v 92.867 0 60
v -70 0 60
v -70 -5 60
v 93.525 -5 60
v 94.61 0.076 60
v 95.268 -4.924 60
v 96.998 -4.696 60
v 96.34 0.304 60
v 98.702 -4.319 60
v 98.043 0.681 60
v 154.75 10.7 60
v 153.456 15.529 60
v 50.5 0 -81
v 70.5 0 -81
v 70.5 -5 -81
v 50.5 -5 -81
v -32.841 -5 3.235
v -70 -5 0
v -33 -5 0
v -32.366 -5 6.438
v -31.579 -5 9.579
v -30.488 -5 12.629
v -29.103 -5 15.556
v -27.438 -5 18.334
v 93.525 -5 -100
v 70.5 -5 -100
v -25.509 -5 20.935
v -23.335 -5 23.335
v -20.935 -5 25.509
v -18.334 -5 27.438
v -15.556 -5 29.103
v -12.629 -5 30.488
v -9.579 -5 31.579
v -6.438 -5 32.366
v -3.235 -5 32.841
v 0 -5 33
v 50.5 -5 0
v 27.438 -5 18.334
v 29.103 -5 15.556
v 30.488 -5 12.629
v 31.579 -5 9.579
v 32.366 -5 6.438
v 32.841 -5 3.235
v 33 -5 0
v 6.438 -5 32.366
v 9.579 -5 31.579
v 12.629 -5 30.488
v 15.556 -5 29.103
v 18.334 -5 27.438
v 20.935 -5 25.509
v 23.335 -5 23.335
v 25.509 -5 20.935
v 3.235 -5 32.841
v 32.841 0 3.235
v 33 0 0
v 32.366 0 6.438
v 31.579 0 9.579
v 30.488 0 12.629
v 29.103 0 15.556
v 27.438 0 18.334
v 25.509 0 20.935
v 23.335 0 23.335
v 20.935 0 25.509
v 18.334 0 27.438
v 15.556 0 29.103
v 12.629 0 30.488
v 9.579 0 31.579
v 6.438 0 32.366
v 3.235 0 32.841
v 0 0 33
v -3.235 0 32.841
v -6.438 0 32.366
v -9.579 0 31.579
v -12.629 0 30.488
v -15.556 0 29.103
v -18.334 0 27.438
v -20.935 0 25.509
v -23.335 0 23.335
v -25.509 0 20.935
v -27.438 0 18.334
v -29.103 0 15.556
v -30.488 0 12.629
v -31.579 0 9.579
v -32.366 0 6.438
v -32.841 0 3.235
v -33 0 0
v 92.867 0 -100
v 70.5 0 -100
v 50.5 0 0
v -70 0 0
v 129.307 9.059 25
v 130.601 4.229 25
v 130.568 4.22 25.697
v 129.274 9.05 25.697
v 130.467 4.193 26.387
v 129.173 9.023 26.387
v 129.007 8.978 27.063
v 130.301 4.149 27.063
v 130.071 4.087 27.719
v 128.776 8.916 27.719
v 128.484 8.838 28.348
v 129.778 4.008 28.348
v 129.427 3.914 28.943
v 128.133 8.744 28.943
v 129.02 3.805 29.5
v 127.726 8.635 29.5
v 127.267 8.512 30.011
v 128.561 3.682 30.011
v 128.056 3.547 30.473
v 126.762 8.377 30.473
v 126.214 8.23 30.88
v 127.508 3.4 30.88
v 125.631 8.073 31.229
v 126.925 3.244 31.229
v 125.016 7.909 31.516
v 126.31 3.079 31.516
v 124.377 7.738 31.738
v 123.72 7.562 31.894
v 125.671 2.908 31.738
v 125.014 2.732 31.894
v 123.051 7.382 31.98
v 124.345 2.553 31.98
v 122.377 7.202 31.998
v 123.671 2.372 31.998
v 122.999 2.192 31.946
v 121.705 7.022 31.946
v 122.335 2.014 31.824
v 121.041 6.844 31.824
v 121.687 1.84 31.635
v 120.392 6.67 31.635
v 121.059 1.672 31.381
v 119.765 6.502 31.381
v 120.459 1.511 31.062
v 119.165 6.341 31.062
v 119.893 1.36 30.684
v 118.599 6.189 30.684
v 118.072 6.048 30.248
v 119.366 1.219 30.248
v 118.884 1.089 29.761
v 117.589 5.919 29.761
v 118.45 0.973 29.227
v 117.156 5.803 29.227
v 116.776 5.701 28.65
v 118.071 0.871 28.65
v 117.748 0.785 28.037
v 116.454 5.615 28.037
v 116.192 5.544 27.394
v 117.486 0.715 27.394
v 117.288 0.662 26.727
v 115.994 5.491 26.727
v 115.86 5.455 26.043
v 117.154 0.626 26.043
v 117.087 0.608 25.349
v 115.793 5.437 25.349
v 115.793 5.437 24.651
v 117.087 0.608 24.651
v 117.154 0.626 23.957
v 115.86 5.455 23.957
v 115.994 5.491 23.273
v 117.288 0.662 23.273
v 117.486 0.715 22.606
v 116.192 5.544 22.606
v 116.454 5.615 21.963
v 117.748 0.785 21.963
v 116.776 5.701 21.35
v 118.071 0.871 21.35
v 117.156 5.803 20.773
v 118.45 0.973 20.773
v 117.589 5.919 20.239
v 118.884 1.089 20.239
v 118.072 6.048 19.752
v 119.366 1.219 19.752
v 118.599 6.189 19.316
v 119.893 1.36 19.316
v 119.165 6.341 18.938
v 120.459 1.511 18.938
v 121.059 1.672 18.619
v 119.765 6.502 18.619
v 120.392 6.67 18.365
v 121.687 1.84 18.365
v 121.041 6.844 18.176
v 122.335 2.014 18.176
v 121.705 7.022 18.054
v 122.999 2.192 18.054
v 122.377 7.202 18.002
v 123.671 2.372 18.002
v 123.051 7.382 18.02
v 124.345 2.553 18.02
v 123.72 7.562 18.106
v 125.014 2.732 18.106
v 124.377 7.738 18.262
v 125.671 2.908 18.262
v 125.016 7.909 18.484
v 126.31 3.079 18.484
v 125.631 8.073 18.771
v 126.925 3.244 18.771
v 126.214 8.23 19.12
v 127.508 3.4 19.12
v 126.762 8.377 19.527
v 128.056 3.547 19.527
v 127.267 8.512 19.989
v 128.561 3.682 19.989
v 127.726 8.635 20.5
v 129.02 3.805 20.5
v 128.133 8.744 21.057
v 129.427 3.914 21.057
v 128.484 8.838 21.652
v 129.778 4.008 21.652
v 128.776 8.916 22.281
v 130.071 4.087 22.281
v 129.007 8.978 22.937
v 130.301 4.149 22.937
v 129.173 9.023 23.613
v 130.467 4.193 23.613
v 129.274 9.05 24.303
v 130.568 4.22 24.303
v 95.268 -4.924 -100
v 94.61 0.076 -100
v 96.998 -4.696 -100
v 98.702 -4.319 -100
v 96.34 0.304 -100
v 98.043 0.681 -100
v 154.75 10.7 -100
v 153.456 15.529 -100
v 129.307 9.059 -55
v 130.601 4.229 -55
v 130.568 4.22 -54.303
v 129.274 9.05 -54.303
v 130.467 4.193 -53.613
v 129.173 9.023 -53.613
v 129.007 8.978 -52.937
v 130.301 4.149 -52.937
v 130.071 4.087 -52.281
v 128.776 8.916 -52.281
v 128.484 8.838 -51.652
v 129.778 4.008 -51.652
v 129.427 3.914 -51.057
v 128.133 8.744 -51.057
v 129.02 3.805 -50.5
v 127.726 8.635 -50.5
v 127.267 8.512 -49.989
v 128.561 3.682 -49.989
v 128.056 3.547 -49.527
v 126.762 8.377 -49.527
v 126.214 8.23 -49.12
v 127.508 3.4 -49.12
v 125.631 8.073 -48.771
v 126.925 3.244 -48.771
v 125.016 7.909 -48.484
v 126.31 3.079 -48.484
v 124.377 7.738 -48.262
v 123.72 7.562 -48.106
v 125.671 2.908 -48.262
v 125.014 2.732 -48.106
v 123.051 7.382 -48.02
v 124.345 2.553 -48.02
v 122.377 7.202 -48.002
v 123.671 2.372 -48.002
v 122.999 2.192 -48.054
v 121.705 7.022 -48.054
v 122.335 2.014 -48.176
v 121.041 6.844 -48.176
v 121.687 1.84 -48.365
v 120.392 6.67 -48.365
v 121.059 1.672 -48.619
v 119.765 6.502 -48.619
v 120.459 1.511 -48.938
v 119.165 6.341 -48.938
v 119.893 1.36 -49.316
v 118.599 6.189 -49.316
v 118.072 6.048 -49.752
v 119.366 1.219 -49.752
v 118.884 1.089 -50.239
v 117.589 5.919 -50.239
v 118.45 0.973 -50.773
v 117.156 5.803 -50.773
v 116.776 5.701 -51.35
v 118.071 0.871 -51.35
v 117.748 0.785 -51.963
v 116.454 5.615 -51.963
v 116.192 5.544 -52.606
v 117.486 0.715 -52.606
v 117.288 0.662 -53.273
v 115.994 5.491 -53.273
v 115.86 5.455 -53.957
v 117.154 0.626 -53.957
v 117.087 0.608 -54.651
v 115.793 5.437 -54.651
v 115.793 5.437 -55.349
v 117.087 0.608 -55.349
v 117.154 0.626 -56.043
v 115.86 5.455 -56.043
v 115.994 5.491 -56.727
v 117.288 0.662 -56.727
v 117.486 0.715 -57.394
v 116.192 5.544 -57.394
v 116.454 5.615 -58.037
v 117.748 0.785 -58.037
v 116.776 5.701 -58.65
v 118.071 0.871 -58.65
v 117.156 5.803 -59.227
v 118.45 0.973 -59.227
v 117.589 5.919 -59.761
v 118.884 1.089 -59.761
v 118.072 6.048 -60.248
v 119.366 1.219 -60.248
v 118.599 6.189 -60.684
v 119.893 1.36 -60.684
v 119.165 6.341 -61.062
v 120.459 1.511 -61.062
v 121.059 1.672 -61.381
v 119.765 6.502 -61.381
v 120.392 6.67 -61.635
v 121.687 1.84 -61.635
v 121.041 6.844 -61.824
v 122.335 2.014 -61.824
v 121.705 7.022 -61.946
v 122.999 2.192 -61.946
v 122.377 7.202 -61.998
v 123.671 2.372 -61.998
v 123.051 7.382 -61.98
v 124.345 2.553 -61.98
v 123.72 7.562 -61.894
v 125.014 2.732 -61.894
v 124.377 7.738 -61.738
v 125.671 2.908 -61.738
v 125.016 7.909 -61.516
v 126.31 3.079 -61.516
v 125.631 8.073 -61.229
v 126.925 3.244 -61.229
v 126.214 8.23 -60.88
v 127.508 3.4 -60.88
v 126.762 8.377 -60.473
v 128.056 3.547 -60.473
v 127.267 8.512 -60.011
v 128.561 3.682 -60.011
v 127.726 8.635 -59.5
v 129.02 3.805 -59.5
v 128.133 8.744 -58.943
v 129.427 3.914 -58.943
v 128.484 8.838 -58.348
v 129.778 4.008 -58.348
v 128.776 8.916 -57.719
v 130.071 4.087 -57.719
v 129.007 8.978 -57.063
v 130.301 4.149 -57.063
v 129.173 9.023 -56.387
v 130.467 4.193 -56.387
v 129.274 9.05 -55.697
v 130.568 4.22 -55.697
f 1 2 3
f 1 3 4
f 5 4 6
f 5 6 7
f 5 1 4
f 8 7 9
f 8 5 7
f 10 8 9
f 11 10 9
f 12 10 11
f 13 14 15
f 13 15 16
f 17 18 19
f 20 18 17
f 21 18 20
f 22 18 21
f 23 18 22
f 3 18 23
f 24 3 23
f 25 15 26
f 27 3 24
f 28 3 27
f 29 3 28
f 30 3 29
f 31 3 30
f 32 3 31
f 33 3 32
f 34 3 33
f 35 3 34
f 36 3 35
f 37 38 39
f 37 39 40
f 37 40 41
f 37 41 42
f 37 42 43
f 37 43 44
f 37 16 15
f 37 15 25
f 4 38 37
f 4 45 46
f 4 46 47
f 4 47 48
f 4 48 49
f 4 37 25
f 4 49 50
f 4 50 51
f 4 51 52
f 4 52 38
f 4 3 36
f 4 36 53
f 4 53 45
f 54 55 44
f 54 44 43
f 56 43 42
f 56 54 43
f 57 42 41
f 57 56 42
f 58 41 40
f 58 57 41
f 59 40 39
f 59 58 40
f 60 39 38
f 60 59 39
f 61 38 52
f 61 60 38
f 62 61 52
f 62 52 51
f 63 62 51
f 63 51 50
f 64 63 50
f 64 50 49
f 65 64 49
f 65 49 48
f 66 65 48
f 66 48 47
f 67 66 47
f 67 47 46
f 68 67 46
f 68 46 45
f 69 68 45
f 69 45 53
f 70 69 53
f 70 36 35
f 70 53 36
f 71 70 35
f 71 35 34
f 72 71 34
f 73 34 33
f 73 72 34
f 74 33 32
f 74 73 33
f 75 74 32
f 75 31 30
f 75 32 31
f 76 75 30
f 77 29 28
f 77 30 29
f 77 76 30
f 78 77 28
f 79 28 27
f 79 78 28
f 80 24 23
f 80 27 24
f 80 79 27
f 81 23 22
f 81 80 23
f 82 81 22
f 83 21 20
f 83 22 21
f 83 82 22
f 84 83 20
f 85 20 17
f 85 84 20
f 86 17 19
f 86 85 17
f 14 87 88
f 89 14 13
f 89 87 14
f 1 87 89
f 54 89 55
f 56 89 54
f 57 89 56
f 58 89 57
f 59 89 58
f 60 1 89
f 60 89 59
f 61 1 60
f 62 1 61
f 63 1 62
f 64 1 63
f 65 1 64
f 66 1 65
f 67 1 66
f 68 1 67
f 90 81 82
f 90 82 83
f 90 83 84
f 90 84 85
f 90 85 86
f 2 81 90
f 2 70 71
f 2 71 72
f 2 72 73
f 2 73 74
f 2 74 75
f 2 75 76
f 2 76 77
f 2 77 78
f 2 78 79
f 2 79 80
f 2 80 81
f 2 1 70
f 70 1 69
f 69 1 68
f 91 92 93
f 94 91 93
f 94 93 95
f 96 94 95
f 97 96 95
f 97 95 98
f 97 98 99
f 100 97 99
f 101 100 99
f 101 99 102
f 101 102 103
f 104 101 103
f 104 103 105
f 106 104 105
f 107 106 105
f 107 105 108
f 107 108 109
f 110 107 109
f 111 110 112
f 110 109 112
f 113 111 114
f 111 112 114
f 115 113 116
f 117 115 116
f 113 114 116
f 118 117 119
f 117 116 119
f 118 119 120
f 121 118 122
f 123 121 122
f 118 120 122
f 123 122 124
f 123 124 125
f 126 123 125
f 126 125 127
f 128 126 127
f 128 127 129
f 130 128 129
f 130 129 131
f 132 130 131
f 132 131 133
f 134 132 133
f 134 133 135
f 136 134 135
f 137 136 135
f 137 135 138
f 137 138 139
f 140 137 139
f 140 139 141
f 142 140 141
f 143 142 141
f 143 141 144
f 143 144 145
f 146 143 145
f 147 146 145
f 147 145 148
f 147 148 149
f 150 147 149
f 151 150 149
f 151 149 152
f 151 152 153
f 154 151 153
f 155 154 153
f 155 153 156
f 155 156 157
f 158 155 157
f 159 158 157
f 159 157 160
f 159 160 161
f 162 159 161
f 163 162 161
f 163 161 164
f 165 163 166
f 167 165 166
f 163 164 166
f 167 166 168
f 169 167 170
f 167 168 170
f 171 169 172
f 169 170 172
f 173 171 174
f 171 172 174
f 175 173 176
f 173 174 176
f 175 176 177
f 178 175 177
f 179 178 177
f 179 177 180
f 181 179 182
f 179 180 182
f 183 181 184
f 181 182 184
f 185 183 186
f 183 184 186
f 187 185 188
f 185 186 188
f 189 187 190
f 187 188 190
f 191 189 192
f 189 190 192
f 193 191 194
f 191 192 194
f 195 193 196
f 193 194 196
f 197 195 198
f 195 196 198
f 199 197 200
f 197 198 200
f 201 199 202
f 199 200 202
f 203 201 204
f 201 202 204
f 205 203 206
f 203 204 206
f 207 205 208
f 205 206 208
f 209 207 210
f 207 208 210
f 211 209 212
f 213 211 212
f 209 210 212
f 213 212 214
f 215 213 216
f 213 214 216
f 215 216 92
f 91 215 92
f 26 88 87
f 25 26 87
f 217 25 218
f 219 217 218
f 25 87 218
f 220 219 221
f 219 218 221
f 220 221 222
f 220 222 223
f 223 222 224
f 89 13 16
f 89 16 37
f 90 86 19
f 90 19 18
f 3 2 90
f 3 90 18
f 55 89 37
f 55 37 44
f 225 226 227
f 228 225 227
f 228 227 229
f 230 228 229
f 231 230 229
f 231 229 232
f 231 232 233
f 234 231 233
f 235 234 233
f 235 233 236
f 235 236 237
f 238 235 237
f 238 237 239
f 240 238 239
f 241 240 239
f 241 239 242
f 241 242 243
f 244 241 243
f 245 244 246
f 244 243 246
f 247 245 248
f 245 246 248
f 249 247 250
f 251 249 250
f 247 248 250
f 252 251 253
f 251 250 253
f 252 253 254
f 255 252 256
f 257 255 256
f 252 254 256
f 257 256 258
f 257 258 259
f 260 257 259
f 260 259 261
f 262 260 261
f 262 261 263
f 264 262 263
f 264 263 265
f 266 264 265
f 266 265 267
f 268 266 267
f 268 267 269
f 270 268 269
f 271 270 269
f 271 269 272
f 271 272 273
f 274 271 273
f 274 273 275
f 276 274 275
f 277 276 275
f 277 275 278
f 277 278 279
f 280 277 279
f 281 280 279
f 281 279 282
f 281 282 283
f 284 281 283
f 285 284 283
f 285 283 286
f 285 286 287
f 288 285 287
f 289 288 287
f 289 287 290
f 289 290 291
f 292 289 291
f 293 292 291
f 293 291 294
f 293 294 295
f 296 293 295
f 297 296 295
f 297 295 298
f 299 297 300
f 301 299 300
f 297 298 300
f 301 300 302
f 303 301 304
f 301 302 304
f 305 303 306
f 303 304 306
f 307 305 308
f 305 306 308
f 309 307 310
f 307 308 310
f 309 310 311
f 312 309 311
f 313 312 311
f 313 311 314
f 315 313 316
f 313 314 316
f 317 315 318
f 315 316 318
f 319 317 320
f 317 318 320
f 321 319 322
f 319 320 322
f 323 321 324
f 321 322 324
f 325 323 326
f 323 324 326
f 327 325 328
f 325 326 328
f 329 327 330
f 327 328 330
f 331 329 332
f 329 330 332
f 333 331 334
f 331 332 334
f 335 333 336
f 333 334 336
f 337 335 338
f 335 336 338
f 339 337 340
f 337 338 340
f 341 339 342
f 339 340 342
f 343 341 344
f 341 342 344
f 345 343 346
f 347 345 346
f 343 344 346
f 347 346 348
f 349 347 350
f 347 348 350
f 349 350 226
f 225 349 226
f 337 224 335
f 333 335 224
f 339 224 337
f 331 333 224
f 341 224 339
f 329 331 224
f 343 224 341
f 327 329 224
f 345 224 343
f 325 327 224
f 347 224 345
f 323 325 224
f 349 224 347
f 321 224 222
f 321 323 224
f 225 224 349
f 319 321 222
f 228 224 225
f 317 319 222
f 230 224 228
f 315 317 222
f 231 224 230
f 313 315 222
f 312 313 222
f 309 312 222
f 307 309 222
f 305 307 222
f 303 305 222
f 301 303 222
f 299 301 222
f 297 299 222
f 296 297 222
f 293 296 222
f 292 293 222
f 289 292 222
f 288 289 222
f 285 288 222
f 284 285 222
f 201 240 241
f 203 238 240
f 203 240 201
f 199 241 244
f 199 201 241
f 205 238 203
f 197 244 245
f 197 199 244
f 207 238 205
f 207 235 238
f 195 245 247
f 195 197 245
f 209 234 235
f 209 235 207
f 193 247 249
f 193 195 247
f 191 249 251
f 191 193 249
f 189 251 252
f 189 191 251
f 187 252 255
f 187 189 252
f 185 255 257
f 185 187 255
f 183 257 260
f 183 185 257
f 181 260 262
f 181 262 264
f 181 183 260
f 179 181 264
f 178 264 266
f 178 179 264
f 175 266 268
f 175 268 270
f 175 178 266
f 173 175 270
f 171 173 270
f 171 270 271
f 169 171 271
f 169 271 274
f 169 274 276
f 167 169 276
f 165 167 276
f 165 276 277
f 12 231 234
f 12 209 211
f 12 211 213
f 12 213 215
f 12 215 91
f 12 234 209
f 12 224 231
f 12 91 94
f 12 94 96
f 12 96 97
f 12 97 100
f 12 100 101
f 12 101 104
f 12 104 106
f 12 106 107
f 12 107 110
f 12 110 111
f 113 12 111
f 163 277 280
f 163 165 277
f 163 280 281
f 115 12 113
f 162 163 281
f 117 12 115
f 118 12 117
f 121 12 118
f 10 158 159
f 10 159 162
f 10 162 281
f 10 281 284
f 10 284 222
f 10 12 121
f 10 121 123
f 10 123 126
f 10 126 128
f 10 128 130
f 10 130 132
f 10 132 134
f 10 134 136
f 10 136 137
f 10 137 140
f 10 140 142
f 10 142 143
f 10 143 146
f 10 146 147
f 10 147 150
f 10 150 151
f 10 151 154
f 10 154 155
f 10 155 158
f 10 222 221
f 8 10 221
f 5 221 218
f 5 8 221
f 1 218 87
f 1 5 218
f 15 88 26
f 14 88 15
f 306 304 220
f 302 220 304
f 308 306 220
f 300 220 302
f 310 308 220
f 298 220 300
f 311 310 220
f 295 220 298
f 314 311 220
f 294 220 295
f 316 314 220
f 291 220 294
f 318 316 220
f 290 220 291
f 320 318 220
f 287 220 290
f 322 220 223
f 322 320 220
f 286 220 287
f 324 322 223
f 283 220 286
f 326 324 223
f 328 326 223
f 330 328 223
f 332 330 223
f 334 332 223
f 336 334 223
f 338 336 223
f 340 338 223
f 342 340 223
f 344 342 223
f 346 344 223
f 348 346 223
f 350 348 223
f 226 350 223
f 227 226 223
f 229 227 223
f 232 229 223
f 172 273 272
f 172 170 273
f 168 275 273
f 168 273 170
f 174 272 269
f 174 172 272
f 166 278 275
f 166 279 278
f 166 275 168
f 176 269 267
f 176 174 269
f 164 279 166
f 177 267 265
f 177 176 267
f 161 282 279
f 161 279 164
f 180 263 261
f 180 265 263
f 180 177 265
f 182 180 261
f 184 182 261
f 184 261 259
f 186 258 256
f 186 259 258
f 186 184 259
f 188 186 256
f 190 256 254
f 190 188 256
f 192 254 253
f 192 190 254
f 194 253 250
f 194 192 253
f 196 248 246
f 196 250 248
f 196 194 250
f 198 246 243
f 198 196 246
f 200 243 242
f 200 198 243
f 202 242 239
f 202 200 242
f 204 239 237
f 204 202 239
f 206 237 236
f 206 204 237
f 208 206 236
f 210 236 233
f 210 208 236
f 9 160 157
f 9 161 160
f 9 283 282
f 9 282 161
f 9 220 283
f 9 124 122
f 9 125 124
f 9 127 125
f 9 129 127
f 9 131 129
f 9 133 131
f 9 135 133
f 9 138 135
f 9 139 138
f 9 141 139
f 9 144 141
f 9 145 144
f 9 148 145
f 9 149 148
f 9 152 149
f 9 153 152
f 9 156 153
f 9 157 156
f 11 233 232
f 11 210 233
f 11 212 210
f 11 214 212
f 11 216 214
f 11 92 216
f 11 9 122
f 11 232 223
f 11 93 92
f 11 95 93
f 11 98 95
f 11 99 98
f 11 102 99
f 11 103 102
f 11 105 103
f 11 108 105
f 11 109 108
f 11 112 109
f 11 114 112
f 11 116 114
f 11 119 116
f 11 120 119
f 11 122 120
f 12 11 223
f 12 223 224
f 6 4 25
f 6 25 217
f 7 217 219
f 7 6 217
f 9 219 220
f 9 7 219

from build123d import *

# Parameters (mm, degrees)
F1_DEPTH      = 60
F1_DEPTH_BACK = 100
F3_DEPTH      = 25
F4_R          = 7
F5_DEPTH      = 25


with BuildPart() as f1:
    # F0 (on Top) → F1 (new body, two sides)
    with BuildSketch(Plane.XY) as f1_sk:
        with BuildLine():
            Line((-70, 0), (-70, -5))
            Line((-70, -5), (93.5252125362, -5))
            ThreePointArc((93.5252125362, -5), (96.1357363806, -4.8288972275), (98.7015934382, -4.3185165258))
            Line((98.7015934382, -4.3185165258), (154.7496448029, 10.6995135747))
            Line((154.7496448029, 10.6995135747), (153.4555495773, 15.5291427062))
            Line((153.4555495773, 15.5291427062), (98.0433309503, 0.6814834742))
            ThreePointArc((98.0433309503, 0.6814834742), (95.4774738927, 0.1711027725), (92.8669500483, 0))
            Line((92.8669500483, 0), (-70, 0))
        make_face()
    extrude(amount=F1_DEPTH)
    extrude(f1_sk.sketch, amount=-F1_DEPTH_BACK)

    # F2 (on Front) → F3 (cut)
    with BuildSketch(Plane.XZ):
        with BuildLine():
            Line((50.5, 0), (33, 0))
            ThreePointArc((33, 0), (0, 33), (-33, 0))
            Line((-33, 0), (-70, 0))
            Line((-70, 0), (-70, -101))
            Line((-70, -101), (70.5, -101))
            Line((70.5, -101), (70.5, -81))
            Line((70.5, -81), (50.5, -81))
            Line((50.5, -81), (50.5, 0))
        make_face()
    extrude(amount=F3_DEPTH, mode=Mode.SUBTRACT)

    # F4 (on face) → F5 (cut)
    with BuildSketch(Plane(origin=(7.6913821948, -28.7046291314, 0), x_dir=(0.9659258263, 0.2588190451, 0), z_dir=(0.2588190451, -0.9659258263, 0))):
        with Locations((120.2459164106, 25)):
            Circle(F4_R)
        with Locations((120.2459164106, -55)):
            Circle(F4_R)
    extrude(amount=-F5_DEPTH, mode=Mode.SUBTRACT)


solid = f1.part
